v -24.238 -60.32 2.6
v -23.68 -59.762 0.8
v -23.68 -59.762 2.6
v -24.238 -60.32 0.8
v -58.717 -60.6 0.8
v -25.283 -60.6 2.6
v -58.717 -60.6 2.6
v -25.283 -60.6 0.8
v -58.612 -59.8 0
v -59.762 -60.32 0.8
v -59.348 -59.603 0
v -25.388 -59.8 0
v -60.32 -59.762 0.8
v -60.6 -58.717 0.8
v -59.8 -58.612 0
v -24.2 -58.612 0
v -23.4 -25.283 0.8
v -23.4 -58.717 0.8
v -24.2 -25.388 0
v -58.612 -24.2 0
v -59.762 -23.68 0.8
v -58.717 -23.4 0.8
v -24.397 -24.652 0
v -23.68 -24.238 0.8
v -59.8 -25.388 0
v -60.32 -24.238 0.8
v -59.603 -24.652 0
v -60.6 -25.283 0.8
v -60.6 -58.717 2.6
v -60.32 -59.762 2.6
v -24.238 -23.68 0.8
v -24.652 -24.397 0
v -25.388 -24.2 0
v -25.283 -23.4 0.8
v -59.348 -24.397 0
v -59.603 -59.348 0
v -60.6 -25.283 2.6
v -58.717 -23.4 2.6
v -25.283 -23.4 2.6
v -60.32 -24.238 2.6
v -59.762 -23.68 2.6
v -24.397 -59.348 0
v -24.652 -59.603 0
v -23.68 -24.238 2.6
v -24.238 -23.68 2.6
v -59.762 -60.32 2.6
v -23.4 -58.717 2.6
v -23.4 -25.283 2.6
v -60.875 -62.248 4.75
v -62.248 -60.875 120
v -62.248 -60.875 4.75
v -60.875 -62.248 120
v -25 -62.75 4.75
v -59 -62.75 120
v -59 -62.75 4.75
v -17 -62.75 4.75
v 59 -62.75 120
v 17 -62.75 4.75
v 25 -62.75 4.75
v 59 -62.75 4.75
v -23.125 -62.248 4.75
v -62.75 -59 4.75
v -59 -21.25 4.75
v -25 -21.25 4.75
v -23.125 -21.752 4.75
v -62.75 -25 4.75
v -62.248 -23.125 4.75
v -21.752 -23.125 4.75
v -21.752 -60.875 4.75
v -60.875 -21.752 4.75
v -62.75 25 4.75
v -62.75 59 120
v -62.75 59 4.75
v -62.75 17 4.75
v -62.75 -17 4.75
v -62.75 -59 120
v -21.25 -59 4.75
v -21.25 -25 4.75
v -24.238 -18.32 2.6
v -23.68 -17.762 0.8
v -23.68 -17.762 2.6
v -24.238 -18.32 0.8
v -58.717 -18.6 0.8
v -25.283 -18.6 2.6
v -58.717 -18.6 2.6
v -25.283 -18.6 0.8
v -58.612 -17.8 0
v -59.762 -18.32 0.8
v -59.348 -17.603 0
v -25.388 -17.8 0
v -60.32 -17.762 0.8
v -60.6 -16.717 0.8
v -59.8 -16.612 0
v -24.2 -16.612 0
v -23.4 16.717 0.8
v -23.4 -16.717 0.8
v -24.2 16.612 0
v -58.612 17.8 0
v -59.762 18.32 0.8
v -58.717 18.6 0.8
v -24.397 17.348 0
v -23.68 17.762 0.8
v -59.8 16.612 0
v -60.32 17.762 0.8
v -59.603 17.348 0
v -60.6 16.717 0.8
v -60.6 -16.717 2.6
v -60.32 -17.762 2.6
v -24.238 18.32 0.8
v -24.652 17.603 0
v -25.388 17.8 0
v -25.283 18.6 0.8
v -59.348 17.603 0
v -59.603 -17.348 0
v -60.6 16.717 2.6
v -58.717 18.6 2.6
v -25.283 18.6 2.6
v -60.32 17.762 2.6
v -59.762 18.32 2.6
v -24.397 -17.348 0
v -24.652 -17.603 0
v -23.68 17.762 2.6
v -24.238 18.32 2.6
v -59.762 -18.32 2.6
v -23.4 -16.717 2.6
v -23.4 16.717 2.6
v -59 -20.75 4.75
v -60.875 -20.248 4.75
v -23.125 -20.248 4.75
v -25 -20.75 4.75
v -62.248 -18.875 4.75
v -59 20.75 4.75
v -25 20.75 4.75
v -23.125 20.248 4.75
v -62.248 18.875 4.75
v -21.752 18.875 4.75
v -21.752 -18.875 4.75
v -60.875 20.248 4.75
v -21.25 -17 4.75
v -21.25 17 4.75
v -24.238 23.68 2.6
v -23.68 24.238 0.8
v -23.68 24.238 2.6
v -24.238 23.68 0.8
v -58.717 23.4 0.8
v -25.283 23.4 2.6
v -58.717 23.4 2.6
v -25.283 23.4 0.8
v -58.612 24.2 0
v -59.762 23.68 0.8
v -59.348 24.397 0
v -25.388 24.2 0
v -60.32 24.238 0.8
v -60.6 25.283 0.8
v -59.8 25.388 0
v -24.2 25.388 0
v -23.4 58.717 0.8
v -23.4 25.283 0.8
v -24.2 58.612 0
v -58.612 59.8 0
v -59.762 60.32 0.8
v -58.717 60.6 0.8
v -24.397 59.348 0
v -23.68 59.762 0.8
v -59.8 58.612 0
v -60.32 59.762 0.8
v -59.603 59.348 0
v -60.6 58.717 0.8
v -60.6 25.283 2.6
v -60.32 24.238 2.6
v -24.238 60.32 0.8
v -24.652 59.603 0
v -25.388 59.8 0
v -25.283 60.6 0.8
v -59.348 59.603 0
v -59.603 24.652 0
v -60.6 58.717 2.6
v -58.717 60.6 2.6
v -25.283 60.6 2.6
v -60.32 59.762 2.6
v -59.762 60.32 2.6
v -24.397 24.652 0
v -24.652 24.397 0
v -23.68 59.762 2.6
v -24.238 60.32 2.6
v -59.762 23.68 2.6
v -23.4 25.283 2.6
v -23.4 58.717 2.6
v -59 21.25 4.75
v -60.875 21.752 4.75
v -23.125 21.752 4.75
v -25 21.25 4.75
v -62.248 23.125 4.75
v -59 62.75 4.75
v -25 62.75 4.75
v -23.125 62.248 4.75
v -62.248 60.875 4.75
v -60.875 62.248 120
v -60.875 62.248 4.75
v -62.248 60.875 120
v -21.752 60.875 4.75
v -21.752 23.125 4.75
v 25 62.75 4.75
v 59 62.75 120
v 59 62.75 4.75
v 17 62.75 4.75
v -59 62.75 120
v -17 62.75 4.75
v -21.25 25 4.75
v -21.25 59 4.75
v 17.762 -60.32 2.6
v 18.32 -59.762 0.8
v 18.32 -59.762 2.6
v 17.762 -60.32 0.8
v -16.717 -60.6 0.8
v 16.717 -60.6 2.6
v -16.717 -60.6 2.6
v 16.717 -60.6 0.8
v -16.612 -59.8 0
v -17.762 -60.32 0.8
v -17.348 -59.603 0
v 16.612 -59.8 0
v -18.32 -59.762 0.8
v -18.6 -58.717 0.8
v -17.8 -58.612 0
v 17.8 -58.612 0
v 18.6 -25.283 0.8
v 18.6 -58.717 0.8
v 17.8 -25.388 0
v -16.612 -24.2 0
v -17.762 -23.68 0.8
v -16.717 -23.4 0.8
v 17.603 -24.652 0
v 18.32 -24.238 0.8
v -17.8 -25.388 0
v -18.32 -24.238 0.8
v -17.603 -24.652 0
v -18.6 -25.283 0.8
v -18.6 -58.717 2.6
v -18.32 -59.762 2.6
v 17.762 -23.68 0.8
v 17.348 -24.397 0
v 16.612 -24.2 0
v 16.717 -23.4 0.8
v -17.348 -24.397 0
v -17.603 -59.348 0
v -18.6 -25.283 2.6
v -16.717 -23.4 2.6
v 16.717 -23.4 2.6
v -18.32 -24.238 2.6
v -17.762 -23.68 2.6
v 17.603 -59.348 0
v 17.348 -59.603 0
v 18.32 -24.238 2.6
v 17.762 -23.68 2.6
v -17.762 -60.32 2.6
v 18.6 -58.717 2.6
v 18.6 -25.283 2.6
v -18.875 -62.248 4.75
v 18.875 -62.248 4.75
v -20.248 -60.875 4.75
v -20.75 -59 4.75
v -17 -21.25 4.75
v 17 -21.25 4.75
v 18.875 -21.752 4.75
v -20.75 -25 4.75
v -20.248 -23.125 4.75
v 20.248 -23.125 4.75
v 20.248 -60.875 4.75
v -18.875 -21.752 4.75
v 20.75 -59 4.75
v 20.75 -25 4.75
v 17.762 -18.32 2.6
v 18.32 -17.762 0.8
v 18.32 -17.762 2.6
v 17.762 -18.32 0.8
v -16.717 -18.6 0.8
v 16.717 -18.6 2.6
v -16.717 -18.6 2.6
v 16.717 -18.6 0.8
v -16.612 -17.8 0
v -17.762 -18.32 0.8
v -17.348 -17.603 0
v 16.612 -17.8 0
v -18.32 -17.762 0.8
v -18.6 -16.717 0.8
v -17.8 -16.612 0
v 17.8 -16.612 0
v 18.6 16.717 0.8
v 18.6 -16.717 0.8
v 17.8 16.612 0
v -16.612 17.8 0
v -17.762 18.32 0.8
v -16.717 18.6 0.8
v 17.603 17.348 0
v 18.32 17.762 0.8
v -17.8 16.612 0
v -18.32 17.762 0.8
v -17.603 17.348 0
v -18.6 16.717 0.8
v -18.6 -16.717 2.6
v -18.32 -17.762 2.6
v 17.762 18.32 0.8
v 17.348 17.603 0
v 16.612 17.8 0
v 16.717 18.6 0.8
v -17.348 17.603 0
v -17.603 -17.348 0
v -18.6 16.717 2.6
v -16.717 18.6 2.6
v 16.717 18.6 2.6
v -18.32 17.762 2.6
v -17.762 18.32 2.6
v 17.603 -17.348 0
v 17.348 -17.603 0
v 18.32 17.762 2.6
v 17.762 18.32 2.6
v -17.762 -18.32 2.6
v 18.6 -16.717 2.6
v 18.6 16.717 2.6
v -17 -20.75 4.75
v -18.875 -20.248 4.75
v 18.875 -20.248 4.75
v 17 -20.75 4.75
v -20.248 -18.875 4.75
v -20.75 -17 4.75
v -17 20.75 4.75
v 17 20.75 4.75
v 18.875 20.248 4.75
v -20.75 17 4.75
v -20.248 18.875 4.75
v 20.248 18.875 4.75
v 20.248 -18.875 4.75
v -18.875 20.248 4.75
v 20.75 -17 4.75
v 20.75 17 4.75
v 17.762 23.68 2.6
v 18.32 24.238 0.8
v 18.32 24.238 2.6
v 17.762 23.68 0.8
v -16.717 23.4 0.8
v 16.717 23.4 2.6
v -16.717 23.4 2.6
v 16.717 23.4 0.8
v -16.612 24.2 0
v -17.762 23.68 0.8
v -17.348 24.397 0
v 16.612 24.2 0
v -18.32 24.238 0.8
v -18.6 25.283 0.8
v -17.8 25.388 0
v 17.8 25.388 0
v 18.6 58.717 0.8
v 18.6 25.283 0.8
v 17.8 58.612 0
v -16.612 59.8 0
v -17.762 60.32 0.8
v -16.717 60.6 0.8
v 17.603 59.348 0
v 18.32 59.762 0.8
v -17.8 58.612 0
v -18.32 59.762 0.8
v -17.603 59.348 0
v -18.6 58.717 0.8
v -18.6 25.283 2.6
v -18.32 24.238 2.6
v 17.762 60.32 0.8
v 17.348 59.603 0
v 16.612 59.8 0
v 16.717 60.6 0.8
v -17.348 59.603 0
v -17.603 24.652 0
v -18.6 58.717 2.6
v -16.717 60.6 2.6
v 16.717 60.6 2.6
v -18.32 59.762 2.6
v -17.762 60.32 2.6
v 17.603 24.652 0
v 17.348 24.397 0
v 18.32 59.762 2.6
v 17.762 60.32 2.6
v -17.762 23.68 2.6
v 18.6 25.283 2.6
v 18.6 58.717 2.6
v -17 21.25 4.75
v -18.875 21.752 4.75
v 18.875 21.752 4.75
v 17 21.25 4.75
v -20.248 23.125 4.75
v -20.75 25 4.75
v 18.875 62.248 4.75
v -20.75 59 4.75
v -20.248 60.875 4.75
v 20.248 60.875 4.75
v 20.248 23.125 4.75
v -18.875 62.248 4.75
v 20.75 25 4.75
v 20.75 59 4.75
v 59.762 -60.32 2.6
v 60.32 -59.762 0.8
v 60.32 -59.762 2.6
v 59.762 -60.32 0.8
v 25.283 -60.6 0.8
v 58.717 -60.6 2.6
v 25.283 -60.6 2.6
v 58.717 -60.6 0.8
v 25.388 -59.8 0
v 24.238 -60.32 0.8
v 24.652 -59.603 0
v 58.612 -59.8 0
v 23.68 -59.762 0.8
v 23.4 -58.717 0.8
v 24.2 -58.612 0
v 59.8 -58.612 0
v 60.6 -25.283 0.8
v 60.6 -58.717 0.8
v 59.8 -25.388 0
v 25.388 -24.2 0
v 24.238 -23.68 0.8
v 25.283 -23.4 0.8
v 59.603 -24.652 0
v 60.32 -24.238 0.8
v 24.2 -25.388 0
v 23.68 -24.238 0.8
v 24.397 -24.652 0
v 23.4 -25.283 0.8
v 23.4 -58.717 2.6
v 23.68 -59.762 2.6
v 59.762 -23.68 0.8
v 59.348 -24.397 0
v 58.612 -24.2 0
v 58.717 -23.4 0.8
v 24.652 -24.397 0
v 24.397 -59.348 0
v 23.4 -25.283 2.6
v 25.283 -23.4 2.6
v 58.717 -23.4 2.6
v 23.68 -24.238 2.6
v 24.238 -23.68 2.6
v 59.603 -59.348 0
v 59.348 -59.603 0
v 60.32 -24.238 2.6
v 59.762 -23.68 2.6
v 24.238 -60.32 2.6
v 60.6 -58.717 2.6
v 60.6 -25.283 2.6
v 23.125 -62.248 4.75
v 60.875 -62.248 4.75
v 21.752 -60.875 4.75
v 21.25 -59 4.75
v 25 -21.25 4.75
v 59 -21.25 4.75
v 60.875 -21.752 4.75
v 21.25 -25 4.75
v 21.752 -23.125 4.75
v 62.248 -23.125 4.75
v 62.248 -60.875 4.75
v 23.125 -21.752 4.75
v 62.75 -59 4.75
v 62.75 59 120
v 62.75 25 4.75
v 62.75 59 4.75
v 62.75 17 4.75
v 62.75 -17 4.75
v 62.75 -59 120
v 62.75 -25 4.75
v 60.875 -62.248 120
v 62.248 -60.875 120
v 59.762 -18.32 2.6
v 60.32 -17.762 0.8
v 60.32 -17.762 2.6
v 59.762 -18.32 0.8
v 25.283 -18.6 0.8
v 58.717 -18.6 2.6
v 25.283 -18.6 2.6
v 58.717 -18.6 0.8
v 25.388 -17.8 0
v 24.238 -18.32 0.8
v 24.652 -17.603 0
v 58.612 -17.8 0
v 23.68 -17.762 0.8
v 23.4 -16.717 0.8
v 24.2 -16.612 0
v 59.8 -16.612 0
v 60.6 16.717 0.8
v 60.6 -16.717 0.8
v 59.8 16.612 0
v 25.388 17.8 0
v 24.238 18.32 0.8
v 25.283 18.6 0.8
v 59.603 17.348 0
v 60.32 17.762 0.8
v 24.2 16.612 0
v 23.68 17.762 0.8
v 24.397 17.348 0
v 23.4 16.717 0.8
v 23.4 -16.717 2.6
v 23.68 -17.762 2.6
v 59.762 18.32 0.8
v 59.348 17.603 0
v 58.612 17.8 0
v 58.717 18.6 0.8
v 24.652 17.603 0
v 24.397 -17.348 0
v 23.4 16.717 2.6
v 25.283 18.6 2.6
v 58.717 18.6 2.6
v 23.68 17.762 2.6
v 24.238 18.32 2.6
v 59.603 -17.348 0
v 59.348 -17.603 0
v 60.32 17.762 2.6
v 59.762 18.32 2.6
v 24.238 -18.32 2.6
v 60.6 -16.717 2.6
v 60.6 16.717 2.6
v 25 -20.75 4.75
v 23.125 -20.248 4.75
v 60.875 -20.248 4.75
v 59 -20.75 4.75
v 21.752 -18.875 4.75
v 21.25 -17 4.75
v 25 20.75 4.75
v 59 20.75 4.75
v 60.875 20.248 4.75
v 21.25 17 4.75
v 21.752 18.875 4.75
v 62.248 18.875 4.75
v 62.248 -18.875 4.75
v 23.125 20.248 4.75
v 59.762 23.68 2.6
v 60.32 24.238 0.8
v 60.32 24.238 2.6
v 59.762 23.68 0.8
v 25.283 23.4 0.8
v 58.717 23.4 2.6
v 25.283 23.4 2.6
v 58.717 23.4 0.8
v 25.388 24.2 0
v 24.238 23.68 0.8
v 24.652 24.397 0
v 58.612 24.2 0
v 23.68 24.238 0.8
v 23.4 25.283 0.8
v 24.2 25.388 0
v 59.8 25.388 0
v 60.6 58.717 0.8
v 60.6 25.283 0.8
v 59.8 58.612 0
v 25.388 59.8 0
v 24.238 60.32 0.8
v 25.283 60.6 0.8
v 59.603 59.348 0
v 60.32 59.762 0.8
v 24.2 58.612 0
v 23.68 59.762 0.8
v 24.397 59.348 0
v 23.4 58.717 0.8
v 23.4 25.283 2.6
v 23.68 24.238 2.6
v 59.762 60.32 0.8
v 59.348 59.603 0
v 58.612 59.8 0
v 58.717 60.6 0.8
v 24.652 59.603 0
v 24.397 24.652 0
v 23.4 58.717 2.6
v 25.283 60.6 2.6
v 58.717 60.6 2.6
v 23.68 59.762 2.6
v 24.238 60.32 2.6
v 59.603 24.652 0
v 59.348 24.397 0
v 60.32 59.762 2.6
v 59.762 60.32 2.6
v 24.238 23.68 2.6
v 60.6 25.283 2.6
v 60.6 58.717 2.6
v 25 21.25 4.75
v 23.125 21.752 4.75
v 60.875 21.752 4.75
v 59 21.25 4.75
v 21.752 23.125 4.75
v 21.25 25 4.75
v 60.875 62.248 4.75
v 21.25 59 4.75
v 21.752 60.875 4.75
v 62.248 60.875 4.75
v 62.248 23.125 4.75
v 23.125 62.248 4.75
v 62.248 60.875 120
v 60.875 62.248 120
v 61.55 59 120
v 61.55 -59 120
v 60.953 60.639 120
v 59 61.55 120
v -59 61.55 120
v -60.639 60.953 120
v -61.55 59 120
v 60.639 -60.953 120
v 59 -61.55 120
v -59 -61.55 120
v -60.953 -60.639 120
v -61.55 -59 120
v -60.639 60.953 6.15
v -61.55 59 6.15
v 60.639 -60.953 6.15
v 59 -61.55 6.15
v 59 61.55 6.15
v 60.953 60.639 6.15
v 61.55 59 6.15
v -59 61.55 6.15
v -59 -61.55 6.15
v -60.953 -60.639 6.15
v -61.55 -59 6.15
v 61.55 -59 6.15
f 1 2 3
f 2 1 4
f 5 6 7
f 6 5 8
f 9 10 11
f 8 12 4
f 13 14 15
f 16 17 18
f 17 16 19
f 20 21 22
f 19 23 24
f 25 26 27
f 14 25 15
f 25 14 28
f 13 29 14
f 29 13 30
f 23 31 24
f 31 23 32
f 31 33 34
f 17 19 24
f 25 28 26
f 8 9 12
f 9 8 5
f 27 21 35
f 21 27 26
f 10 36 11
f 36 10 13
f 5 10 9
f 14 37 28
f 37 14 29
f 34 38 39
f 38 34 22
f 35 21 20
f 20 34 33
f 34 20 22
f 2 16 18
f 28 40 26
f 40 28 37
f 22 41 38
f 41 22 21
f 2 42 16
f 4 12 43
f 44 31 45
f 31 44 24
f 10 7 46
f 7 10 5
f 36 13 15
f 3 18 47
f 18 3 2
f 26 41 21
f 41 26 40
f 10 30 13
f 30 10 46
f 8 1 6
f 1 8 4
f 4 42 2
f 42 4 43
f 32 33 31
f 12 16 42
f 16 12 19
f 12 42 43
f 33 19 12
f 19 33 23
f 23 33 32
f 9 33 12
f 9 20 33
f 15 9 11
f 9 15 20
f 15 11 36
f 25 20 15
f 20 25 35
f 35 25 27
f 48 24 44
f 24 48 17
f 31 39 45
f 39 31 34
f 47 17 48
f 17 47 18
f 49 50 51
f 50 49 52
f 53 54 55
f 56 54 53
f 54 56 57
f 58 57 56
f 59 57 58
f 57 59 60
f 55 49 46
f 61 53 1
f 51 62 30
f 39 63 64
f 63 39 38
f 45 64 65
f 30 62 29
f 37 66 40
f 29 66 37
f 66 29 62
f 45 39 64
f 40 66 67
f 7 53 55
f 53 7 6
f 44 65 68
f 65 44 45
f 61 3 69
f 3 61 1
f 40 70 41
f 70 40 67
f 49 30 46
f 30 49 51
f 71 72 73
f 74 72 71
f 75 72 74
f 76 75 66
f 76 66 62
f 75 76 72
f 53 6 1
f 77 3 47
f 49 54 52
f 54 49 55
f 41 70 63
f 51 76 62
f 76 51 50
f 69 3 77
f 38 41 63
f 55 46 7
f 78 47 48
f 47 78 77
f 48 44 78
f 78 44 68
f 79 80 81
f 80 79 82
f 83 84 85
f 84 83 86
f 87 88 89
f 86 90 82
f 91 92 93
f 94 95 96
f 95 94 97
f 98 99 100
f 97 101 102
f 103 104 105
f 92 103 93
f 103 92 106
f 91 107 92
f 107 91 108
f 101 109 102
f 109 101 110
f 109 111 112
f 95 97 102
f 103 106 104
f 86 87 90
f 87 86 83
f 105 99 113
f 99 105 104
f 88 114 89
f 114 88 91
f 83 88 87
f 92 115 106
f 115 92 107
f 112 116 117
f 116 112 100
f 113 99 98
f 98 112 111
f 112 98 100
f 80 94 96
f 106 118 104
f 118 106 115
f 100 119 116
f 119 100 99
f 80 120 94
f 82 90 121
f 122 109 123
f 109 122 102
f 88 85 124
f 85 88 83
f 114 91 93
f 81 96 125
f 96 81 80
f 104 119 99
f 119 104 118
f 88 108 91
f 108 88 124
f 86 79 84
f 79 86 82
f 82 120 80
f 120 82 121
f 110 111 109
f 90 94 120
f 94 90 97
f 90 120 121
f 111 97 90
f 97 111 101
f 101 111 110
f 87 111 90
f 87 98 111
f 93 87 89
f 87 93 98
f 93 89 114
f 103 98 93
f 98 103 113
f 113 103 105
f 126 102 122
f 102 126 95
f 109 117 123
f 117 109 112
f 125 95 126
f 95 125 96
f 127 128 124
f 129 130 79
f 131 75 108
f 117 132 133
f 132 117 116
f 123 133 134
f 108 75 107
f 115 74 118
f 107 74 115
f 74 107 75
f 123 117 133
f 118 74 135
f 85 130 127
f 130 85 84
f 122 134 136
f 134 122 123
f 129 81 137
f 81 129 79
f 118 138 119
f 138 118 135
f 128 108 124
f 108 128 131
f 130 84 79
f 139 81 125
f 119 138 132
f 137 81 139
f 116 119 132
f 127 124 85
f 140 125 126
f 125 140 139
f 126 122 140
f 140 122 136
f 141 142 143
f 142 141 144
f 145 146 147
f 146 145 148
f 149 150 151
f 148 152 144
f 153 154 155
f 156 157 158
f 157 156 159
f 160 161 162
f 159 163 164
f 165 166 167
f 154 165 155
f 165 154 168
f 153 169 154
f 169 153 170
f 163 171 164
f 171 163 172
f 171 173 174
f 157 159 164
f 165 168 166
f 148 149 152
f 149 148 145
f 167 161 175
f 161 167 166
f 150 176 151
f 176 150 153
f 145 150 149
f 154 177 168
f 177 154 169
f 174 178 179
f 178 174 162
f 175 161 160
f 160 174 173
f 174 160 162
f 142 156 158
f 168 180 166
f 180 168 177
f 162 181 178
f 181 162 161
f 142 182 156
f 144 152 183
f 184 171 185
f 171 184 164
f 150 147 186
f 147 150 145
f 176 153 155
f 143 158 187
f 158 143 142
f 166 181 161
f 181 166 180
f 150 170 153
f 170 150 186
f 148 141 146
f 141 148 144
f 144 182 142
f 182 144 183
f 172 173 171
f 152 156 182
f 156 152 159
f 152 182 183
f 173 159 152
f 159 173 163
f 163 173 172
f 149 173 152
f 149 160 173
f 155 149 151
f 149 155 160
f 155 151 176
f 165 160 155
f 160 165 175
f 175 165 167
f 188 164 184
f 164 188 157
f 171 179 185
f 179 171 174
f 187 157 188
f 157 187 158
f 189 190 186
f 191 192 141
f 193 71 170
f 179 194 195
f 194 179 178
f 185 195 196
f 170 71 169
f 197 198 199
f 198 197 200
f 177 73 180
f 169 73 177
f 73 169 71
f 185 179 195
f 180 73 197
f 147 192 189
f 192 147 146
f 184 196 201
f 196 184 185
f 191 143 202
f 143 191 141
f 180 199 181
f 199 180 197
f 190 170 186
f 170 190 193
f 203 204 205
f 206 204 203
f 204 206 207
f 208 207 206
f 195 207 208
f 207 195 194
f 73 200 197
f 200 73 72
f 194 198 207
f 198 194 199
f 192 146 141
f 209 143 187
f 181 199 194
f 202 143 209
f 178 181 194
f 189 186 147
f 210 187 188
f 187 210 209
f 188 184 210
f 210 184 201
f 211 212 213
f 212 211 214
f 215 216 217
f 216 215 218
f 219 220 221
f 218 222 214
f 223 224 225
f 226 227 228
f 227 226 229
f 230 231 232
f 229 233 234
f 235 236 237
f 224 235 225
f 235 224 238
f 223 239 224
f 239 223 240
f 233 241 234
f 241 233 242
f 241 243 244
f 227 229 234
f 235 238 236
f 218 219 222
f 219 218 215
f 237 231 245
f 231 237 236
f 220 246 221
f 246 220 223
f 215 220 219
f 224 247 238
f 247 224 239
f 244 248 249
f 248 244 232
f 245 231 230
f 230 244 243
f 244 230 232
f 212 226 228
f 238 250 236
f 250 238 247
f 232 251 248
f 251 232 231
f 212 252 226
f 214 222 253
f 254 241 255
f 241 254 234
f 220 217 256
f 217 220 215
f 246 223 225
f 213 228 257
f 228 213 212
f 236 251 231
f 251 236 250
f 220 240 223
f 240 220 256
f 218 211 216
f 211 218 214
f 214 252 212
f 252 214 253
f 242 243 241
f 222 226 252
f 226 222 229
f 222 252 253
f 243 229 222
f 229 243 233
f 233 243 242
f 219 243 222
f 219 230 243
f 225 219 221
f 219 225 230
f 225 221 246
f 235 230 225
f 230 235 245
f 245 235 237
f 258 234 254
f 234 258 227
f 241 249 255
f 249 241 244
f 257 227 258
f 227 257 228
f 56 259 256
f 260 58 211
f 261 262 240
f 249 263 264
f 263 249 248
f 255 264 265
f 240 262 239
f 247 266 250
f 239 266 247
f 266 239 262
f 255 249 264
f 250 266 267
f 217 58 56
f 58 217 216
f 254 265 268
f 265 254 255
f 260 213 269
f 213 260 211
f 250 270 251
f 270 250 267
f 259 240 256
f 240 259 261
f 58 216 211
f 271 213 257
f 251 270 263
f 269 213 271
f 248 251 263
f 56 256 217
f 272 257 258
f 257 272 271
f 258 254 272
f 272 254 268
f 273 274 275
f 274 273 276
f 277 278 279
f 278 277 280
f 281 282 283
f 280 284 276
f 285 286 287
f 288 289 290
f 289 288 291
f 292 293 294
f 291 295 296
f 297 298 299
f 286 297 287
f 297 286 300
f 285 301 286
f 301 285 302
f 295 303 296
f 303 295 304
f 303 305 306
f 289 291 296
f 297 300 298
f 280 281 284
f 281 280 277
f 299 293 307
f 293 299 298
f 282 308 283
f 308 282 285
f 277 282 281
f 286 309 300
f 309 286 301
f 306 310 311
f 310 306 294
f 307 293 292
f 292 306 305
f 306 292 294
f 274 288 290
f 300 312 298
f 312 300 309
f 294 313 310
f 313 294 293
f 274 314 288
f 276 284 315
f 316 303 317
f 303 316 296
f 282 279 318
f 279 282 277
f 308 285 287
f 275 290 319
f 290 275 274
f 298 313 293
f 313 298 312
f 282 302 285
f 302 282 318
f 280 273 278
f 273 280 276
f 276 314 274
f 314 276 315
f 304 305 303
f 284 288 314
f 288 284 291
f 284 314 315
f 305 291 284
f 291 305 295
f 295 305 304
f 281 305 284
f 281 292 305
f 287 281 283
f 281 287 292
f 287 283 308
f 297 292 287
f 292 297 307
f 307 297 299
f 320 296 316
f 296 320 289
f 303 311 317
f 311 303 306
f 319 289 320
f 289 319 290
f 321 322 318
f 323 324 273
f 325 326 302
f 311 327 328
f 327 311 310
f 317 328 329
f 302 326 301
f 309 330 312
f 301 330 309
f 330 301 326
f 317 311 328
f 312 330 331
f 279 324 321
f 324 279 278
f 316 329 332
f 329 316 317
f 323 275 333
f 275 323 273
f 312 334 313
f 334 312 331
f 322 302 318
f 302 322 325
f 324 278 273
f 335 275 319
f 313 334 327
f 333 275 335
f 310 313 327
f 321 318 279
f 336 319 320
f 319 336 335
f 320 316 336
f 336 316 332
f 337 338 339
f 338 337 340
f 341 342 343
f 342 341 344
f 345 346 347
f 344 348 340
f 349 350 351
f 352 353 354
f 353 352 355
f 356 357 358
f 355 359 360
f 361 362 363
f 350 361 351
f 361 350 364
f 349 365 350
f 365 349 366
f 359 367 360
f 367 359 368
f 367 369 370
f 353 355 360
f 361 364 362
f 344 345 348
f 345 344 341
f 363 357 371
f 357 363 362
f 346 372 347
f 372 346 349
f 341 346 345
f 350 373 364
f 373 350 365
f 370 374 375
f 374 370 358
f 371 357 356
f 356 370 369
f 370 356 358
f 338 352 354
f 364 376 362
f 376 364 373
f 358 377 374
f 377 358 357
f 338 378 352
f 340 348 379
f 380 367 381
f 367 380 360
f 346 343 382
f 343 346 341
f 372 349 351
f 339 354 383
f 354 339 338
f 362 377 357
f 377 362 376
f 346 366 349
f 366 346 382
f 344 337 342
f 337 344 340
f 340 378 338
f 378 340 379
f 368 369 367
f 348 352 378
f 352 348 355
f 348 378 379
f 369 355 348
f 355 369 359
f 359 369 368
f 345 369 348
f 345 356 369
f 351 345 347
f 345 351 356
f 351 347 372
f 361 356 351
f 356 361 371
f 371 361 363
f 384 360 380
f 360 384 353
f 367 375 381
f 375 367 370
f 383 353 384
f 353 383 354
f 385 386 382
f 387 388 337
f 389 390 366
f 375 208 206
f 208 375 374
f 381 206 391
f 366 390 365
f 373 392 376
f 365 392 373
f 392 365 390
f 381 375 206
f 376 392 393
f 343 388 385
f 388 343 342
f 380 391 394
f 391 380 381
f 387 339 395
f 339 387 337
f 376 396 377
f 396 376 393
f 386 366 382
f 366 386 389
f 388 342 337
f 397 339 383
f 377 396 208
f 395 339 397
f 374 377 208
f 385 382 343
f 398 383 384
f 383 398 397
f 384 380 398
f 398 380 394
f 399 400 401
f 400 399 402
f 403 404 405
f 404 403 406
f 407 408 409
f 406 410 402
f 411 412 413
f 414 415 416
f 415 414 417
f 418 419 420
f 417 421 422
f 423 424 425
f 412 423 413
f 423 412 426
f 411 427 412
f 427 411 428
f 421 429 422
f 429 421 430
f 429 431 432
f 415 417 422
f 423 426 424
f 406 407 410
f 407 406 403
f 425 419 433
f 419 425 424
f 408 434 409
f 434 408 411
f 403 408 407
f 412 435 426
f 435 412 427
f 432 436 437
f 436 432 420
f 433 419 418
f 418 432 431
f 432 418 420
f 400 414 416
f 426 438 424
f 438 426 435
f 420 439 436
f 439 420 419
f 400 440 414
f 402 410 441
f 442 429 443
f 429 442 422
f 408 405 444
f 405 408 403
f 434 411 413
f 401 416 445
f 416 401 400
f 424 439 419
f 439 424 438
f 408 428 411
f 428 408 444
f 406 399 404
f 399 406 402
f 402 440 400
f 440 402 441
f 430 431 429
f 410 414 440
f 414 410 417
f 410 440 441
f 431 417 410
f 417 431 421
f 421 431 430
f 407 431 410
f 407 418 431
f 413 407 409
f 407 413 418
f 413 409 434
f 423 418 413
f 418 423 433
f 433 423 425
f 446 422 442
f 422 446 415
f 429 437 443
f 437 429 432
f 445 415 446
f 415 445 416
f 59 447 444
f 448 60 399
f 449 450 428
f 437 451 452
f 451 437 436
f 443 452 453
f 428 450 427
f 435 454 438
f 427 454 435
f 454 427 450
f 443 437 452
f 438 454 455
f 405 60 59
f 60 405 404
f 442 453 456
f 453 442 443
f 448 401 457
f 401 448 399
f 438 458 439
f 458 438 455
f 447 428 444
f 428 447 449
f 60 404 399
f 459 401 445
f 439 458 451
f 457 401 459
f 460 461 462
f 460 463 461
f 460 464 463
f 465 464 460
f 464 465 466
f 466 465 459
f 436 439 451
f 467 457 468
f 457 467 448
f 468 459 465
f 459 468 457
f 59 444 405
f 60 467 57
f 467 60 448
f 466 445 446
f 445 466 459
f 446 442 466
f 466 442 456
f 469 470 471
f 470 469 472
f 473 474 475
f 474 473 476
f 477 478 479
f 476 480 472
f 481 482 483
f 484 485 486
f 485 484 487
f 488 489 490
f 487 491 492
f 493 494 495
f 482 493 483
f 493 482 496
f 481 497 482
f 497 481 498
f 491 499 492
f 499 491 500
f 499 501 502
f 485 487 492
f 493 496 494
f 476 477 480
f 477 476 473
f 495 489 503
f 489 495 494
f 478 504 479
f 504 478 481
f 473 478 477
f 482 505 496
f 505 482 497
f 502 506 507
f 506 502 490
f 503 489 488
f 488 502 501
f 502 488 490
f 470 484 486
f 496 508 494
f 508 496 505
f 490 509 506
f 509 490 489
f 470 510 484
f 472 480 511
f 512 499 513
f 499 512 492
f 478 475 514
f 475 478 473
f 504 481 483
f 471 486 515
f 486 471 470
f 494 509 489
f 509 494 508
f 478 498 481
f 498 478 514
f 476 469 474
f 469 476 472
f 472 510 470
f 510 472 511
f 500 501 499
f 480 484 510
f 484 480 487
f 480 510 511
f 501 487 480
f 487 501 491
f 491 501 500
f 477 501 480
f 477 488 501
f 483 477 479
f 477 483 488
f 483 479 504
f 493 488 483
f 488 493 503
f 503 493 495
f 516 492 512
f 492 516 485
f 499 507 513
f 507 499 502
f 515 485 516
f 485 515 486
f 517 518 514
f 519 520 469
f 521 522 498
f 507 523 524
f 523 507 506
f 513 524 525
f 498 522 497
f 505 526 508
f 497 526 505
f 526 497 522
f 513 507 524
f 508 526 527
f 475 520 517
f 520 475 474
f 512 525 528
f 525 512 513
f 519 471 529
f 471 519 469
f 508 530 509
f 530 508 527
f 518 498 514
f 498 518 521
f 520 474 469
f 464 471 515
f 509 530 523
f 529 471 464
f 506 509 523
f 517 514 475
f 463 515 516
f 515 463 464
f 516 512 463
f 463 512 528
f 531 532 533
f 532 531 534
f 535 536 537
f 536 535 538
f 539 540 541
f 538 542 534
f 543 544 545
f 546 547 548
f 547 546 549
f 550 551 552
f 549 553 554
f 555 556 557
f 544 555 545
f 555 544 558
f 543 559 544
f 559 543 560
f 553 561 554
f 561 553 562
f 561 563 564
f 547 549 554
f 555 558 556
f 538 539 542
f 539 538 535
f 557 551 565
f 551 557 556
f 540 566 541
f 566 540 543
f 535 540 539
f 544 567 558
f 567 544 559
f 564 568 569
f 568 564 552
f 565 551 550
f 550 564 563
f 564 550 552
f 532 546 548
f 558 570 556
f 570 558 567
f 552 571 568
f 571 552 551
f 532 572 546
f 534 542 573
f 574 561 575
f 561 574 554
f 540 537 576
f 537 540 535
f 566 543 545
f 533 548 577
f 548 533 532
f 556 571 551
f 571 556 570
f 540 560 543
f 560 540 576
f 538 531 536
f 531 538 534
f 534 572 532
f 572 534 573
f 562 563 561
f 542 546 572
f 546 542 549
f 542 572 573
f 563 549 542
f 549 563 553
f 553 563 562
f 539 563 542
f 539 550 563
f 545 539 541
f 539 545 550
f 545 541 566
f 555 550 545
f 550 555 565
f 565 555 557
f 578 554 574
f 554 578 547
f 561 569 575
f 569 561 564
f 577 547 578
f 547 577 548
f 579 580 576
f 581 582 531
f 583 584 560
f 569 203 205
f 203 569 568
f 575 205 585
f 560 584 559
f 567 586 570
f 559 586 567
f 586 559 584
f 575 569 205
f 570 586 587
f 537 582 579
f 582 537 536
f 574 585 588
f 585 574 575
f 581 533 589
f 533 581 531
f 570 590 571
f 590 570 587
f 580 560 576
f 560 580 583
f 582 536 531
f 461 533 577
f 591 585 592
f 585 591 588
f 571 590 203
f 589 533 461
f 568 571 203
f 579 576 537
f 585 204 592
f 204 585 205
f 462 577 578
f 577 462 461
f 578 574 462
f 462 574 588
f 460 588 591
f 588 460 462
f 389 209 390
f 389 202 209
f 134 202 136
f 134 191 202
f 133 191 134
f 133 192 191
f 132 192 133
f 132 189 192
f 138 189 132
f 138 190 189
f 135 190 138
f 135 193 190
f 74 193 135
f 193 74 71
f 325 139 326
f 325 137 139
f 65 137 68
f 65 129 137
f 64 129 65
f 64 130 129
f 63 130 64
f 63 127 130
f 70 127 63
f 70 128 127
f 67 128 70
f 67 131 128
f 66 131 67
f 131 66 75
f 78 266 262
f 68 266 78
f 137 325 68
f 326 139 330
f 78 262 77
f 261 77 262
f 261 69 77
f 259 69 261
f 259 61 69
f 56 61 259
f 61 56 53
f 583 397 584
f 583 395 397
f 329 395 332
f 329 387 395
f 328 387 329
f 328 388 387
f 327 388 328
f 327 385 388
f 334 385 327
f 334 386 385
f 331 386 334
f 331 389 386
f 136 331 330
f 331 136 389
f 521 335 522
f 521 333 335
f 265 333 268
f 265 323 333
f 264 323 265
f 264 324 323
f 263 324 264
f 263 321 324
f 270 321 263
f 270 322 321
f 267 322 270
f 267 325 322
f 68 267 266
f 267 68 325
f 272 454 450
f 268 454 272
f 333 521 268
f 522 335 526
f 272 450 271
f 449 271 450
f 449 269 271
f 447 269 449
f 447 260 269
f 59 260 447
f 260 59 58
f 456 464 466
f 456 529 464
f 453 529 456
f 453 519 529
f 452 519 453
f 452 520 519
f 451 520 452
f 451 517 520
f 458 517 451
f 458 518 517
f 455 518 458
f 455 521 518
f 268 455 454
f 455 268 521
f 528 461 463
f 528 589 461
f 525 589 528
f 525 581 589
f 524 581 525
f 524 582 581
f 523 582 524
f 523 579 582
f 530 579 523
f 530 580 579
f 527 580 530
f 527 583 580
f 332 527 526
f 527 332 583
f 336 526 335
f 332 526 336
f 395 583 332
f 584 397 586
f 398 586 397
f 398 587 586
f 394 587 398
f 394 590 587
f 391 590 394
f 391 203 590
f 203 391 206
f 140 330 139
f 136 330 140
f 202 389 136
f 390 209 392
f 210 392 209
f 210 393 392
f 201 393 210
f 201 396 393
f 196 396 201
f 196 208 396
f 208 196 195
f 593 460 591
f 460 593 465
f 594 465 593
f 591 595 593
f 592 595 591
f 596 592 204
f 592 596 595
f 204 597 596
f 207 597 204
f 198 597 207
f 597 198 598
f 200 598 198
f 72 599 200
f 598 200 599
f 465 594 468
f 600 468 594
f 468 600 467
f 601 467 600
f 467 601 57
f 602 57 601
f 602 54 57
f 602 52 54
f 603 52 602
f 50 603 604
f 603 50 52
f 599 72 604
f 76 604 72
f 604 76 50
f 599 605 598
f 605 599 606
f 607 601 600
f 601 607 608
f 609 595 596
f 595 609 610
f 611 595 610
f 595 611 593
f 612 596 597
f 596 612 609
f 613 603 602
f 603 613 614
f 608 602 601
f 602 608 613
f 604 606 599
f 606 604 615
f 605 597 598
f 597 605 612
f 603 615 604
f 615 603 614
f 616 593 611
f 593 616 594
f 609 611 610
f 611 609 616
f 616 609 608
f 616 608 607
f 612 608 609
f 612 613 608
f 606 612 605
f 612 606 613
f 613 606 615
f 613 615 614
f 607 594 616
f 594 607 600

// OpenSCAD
// file: ../lib/gridfinity.scad
// gridfinity.scad — shared Gridfinity baseplate + bin library (per spec).
//
// 42 mm pitch, 41.5 mm bins, baseplate socket 0.7/1.8/2.15 = 4.65 mm, 4 mm
// fillet; bin foot 0.8/1.8/2.15 = 4.75 mm, 3.75 mm corner radius. Verified the
// bin foot seats in the baseplate socket with ~0.25–0.5 mm clearance.
//
//   baseplate(nx, ny)                      — tiled receiving baseplate
//   bin(nx, ny, h, wall, floor)            — open Gridfinity bin
//   divided_bin(nx, ny, h, cols, rows, …)  — bin with internal compartments

GF = 42; GF_FILLET = 4;
_C_TOP = 2.15; _C_MID = 1.8; _C_BOT = 0.7;
_BP_LIP = _C_TOP + _C_MID + _C_BOT; _BP_FLOOR = 1.2; BP_H = _BP_LIP + _BP_FLOOR;  // 5.85
BIN_SZ = 41.5; BIN_R = 3.75; BIN_BASE_H = 4.75;

// ---- baseplate ----
module _bp_cell(i = 0) { offset(r = -i) offset(r = GF_FILLET) offset(r = -GF_FILLET) square(GF, center = true); }
module _bp_socket() {
    e = 0.01;
    hull() { translate([0,0,BP_H-e]) linear_extrude(e) _bp_cell(0); translate([0,0,BP_H-_C_TOP]) linear_extrude(e) _bp_cell(_C_TOP); }
    translate([0,0,BP_H-_C_TOP-_C_MID]) linear_extrude(_C_MID) _bp_cell(_C_TOP);
    hull() { translate([0,0,BP_H-_C_TOP-_C_MID-e]) linear_extrude(e) _bp_cell(_C_TOP); translate([0,0,BP_H-_BP_LIP]) linear_extrude(e) _bp_cell(_C_TOP+_C_BOT); }
}
module baseplate(nx, ny) {
    w = nx*GF; d = ny*GF;
    difference() {
        translate([0,0,BP_H/2]) linear_extrude(BP_H, center=true) offset(GF_FILLET) offset(-GF_FILLET) square([w,d], center=true);
        for (ix=[0:nx-1], iy=[0:ny-1]) translate([(ix-(nx-1)/2)*GF, (iy-(ny-1)/2)*GF, 0]) _bp_socket();
    }
}

// ---- bin ----
module _bin_cell(i = 0) { offset(r = -i) offset(r = BIN_R) offset(r = -BIN_R) square(BIN_SZ, center = true); }
module _bin_foot() {
    e = 0.01;
    hull() { linear_extrude(e) _bin_cell(2.95); translate([0,0,0.8]) linear_extrude(e) _bin_cell(2.15); }    // bottom chamfer
    translate([0,0,0.8]) linear_extrude(1.8) _bin_cell(2.15);                                                 // vertical
    hull() { translate([0,0,2.6]) linear_extrude(e) _bin_cell(2.15); translate([0,0,BIN_BASE_H]) linear_extrude(e) _bin_cell(0); } // top chamfer
}
module _bin_shell(nx, ny, h, wall, floor) {
    W = nx*GF - 0.5; D = ny*GF - 0.5;
    difference() {
        union() {
            for (ix=[0:nx-1], iy=[0:ny-1]) translate([(ix-(nx-1)/2)*GF, (iy-(ny-1)/2)*GF, 0]) _bin_foot();
            translate([0,0,BIN_BASE_H]) linear_extrude(h-BIN_BASE_H) offset(BIN_R) offset(-BIN_R) square([W,D], center=true);
        }
        translate([0,0,BIN_BASE_H+floor]) linear_extrude(h) offset(BIN_R-wall) offset(-(BIN_R-wall)) square([W-2*wall, D-2*wall], center=true);
    }
}
module bin(nx, ny, h, wall = 1.2, floor = 1.4) { _bin_shell(nx, ny, h, wall, floor); }

module divided_bin(nx, ny, h, cols = 1, rows = 1, wall = 1.2, floor = 1.4, div = 1.2) {
    W = nx*GF - 0.5; D = ny*GF - 0.5;
    union() {
        bin(nx, ny, h, wall, floor);
        // internal divider walls (from the floor up to the rim)
        iw = W - 2*wall; id = D - 2*wall; z0 = BIN_BASE_H + floor;
        for (c = [1 : cols-1]) translate([-iw/2 + c*iw/cols - div/2, -id/2, z0]) cube([div, id, h - z0]);
        for (r = [1 : rows-1]) translate([-iw/2, -id/2 + r*id/rows - div/2, z0]) cube([iw, div, h - z0]);
    }
}
// file: apache_organizer_common.scad
// apache_organizer_common.scad — shared bits for the Apache 5800 cord organizer.
//
// Case interior: 514 × 289 × 144 mm. The floor is a 12 × 6 Gridfinity grid
// (504 × 252) printed as two 6 × 6 tiles; the ~37 mm spare on one long side is
// a cable channel, ~5 mm border at each end. Tiles butt and the case walls hold
// them; 2 alignment pegs per mating edge keep them flush and slide-together.

include <../lib/gridfinity.scad>

TILE_NX = 6; TILE_NY = 6;       // each tile (252 × 252)
PEG_D = 3.5; PEG_L = 6; PEG_Y = 60;

// Tile with alignment pegs on +X edge and matching holes on -X edge, so two
// identical tiles chain along the case length.
module organizer_tile() {
    w = TILE_NX * GF;            // 252
    difference() {
        union() {
            baseplate(TILE_NX, TILE_NY);
            for (y = [PEG_Y, -PEG_Y]) translate([w/2, y, BP_H/2]) rotate([0,90,0]) cylinder(d = PEG_D, h = PEG_L); // +X pegs
        }
        for (y = [PEG_Y, -PEG_Y]) translate([-w/2 - 0.1, y, BP_H/2]) rotate([0,90,0]) cylinder(d = PEG_D + 0.4, h = PEG_L + 1); // -X holes
    }
}
// main file
// bin_coil — deep 3×3 bin for coiled cords / cable rolls.
include <apache_organizer_common.scad>
bin(3, 3, 120);
